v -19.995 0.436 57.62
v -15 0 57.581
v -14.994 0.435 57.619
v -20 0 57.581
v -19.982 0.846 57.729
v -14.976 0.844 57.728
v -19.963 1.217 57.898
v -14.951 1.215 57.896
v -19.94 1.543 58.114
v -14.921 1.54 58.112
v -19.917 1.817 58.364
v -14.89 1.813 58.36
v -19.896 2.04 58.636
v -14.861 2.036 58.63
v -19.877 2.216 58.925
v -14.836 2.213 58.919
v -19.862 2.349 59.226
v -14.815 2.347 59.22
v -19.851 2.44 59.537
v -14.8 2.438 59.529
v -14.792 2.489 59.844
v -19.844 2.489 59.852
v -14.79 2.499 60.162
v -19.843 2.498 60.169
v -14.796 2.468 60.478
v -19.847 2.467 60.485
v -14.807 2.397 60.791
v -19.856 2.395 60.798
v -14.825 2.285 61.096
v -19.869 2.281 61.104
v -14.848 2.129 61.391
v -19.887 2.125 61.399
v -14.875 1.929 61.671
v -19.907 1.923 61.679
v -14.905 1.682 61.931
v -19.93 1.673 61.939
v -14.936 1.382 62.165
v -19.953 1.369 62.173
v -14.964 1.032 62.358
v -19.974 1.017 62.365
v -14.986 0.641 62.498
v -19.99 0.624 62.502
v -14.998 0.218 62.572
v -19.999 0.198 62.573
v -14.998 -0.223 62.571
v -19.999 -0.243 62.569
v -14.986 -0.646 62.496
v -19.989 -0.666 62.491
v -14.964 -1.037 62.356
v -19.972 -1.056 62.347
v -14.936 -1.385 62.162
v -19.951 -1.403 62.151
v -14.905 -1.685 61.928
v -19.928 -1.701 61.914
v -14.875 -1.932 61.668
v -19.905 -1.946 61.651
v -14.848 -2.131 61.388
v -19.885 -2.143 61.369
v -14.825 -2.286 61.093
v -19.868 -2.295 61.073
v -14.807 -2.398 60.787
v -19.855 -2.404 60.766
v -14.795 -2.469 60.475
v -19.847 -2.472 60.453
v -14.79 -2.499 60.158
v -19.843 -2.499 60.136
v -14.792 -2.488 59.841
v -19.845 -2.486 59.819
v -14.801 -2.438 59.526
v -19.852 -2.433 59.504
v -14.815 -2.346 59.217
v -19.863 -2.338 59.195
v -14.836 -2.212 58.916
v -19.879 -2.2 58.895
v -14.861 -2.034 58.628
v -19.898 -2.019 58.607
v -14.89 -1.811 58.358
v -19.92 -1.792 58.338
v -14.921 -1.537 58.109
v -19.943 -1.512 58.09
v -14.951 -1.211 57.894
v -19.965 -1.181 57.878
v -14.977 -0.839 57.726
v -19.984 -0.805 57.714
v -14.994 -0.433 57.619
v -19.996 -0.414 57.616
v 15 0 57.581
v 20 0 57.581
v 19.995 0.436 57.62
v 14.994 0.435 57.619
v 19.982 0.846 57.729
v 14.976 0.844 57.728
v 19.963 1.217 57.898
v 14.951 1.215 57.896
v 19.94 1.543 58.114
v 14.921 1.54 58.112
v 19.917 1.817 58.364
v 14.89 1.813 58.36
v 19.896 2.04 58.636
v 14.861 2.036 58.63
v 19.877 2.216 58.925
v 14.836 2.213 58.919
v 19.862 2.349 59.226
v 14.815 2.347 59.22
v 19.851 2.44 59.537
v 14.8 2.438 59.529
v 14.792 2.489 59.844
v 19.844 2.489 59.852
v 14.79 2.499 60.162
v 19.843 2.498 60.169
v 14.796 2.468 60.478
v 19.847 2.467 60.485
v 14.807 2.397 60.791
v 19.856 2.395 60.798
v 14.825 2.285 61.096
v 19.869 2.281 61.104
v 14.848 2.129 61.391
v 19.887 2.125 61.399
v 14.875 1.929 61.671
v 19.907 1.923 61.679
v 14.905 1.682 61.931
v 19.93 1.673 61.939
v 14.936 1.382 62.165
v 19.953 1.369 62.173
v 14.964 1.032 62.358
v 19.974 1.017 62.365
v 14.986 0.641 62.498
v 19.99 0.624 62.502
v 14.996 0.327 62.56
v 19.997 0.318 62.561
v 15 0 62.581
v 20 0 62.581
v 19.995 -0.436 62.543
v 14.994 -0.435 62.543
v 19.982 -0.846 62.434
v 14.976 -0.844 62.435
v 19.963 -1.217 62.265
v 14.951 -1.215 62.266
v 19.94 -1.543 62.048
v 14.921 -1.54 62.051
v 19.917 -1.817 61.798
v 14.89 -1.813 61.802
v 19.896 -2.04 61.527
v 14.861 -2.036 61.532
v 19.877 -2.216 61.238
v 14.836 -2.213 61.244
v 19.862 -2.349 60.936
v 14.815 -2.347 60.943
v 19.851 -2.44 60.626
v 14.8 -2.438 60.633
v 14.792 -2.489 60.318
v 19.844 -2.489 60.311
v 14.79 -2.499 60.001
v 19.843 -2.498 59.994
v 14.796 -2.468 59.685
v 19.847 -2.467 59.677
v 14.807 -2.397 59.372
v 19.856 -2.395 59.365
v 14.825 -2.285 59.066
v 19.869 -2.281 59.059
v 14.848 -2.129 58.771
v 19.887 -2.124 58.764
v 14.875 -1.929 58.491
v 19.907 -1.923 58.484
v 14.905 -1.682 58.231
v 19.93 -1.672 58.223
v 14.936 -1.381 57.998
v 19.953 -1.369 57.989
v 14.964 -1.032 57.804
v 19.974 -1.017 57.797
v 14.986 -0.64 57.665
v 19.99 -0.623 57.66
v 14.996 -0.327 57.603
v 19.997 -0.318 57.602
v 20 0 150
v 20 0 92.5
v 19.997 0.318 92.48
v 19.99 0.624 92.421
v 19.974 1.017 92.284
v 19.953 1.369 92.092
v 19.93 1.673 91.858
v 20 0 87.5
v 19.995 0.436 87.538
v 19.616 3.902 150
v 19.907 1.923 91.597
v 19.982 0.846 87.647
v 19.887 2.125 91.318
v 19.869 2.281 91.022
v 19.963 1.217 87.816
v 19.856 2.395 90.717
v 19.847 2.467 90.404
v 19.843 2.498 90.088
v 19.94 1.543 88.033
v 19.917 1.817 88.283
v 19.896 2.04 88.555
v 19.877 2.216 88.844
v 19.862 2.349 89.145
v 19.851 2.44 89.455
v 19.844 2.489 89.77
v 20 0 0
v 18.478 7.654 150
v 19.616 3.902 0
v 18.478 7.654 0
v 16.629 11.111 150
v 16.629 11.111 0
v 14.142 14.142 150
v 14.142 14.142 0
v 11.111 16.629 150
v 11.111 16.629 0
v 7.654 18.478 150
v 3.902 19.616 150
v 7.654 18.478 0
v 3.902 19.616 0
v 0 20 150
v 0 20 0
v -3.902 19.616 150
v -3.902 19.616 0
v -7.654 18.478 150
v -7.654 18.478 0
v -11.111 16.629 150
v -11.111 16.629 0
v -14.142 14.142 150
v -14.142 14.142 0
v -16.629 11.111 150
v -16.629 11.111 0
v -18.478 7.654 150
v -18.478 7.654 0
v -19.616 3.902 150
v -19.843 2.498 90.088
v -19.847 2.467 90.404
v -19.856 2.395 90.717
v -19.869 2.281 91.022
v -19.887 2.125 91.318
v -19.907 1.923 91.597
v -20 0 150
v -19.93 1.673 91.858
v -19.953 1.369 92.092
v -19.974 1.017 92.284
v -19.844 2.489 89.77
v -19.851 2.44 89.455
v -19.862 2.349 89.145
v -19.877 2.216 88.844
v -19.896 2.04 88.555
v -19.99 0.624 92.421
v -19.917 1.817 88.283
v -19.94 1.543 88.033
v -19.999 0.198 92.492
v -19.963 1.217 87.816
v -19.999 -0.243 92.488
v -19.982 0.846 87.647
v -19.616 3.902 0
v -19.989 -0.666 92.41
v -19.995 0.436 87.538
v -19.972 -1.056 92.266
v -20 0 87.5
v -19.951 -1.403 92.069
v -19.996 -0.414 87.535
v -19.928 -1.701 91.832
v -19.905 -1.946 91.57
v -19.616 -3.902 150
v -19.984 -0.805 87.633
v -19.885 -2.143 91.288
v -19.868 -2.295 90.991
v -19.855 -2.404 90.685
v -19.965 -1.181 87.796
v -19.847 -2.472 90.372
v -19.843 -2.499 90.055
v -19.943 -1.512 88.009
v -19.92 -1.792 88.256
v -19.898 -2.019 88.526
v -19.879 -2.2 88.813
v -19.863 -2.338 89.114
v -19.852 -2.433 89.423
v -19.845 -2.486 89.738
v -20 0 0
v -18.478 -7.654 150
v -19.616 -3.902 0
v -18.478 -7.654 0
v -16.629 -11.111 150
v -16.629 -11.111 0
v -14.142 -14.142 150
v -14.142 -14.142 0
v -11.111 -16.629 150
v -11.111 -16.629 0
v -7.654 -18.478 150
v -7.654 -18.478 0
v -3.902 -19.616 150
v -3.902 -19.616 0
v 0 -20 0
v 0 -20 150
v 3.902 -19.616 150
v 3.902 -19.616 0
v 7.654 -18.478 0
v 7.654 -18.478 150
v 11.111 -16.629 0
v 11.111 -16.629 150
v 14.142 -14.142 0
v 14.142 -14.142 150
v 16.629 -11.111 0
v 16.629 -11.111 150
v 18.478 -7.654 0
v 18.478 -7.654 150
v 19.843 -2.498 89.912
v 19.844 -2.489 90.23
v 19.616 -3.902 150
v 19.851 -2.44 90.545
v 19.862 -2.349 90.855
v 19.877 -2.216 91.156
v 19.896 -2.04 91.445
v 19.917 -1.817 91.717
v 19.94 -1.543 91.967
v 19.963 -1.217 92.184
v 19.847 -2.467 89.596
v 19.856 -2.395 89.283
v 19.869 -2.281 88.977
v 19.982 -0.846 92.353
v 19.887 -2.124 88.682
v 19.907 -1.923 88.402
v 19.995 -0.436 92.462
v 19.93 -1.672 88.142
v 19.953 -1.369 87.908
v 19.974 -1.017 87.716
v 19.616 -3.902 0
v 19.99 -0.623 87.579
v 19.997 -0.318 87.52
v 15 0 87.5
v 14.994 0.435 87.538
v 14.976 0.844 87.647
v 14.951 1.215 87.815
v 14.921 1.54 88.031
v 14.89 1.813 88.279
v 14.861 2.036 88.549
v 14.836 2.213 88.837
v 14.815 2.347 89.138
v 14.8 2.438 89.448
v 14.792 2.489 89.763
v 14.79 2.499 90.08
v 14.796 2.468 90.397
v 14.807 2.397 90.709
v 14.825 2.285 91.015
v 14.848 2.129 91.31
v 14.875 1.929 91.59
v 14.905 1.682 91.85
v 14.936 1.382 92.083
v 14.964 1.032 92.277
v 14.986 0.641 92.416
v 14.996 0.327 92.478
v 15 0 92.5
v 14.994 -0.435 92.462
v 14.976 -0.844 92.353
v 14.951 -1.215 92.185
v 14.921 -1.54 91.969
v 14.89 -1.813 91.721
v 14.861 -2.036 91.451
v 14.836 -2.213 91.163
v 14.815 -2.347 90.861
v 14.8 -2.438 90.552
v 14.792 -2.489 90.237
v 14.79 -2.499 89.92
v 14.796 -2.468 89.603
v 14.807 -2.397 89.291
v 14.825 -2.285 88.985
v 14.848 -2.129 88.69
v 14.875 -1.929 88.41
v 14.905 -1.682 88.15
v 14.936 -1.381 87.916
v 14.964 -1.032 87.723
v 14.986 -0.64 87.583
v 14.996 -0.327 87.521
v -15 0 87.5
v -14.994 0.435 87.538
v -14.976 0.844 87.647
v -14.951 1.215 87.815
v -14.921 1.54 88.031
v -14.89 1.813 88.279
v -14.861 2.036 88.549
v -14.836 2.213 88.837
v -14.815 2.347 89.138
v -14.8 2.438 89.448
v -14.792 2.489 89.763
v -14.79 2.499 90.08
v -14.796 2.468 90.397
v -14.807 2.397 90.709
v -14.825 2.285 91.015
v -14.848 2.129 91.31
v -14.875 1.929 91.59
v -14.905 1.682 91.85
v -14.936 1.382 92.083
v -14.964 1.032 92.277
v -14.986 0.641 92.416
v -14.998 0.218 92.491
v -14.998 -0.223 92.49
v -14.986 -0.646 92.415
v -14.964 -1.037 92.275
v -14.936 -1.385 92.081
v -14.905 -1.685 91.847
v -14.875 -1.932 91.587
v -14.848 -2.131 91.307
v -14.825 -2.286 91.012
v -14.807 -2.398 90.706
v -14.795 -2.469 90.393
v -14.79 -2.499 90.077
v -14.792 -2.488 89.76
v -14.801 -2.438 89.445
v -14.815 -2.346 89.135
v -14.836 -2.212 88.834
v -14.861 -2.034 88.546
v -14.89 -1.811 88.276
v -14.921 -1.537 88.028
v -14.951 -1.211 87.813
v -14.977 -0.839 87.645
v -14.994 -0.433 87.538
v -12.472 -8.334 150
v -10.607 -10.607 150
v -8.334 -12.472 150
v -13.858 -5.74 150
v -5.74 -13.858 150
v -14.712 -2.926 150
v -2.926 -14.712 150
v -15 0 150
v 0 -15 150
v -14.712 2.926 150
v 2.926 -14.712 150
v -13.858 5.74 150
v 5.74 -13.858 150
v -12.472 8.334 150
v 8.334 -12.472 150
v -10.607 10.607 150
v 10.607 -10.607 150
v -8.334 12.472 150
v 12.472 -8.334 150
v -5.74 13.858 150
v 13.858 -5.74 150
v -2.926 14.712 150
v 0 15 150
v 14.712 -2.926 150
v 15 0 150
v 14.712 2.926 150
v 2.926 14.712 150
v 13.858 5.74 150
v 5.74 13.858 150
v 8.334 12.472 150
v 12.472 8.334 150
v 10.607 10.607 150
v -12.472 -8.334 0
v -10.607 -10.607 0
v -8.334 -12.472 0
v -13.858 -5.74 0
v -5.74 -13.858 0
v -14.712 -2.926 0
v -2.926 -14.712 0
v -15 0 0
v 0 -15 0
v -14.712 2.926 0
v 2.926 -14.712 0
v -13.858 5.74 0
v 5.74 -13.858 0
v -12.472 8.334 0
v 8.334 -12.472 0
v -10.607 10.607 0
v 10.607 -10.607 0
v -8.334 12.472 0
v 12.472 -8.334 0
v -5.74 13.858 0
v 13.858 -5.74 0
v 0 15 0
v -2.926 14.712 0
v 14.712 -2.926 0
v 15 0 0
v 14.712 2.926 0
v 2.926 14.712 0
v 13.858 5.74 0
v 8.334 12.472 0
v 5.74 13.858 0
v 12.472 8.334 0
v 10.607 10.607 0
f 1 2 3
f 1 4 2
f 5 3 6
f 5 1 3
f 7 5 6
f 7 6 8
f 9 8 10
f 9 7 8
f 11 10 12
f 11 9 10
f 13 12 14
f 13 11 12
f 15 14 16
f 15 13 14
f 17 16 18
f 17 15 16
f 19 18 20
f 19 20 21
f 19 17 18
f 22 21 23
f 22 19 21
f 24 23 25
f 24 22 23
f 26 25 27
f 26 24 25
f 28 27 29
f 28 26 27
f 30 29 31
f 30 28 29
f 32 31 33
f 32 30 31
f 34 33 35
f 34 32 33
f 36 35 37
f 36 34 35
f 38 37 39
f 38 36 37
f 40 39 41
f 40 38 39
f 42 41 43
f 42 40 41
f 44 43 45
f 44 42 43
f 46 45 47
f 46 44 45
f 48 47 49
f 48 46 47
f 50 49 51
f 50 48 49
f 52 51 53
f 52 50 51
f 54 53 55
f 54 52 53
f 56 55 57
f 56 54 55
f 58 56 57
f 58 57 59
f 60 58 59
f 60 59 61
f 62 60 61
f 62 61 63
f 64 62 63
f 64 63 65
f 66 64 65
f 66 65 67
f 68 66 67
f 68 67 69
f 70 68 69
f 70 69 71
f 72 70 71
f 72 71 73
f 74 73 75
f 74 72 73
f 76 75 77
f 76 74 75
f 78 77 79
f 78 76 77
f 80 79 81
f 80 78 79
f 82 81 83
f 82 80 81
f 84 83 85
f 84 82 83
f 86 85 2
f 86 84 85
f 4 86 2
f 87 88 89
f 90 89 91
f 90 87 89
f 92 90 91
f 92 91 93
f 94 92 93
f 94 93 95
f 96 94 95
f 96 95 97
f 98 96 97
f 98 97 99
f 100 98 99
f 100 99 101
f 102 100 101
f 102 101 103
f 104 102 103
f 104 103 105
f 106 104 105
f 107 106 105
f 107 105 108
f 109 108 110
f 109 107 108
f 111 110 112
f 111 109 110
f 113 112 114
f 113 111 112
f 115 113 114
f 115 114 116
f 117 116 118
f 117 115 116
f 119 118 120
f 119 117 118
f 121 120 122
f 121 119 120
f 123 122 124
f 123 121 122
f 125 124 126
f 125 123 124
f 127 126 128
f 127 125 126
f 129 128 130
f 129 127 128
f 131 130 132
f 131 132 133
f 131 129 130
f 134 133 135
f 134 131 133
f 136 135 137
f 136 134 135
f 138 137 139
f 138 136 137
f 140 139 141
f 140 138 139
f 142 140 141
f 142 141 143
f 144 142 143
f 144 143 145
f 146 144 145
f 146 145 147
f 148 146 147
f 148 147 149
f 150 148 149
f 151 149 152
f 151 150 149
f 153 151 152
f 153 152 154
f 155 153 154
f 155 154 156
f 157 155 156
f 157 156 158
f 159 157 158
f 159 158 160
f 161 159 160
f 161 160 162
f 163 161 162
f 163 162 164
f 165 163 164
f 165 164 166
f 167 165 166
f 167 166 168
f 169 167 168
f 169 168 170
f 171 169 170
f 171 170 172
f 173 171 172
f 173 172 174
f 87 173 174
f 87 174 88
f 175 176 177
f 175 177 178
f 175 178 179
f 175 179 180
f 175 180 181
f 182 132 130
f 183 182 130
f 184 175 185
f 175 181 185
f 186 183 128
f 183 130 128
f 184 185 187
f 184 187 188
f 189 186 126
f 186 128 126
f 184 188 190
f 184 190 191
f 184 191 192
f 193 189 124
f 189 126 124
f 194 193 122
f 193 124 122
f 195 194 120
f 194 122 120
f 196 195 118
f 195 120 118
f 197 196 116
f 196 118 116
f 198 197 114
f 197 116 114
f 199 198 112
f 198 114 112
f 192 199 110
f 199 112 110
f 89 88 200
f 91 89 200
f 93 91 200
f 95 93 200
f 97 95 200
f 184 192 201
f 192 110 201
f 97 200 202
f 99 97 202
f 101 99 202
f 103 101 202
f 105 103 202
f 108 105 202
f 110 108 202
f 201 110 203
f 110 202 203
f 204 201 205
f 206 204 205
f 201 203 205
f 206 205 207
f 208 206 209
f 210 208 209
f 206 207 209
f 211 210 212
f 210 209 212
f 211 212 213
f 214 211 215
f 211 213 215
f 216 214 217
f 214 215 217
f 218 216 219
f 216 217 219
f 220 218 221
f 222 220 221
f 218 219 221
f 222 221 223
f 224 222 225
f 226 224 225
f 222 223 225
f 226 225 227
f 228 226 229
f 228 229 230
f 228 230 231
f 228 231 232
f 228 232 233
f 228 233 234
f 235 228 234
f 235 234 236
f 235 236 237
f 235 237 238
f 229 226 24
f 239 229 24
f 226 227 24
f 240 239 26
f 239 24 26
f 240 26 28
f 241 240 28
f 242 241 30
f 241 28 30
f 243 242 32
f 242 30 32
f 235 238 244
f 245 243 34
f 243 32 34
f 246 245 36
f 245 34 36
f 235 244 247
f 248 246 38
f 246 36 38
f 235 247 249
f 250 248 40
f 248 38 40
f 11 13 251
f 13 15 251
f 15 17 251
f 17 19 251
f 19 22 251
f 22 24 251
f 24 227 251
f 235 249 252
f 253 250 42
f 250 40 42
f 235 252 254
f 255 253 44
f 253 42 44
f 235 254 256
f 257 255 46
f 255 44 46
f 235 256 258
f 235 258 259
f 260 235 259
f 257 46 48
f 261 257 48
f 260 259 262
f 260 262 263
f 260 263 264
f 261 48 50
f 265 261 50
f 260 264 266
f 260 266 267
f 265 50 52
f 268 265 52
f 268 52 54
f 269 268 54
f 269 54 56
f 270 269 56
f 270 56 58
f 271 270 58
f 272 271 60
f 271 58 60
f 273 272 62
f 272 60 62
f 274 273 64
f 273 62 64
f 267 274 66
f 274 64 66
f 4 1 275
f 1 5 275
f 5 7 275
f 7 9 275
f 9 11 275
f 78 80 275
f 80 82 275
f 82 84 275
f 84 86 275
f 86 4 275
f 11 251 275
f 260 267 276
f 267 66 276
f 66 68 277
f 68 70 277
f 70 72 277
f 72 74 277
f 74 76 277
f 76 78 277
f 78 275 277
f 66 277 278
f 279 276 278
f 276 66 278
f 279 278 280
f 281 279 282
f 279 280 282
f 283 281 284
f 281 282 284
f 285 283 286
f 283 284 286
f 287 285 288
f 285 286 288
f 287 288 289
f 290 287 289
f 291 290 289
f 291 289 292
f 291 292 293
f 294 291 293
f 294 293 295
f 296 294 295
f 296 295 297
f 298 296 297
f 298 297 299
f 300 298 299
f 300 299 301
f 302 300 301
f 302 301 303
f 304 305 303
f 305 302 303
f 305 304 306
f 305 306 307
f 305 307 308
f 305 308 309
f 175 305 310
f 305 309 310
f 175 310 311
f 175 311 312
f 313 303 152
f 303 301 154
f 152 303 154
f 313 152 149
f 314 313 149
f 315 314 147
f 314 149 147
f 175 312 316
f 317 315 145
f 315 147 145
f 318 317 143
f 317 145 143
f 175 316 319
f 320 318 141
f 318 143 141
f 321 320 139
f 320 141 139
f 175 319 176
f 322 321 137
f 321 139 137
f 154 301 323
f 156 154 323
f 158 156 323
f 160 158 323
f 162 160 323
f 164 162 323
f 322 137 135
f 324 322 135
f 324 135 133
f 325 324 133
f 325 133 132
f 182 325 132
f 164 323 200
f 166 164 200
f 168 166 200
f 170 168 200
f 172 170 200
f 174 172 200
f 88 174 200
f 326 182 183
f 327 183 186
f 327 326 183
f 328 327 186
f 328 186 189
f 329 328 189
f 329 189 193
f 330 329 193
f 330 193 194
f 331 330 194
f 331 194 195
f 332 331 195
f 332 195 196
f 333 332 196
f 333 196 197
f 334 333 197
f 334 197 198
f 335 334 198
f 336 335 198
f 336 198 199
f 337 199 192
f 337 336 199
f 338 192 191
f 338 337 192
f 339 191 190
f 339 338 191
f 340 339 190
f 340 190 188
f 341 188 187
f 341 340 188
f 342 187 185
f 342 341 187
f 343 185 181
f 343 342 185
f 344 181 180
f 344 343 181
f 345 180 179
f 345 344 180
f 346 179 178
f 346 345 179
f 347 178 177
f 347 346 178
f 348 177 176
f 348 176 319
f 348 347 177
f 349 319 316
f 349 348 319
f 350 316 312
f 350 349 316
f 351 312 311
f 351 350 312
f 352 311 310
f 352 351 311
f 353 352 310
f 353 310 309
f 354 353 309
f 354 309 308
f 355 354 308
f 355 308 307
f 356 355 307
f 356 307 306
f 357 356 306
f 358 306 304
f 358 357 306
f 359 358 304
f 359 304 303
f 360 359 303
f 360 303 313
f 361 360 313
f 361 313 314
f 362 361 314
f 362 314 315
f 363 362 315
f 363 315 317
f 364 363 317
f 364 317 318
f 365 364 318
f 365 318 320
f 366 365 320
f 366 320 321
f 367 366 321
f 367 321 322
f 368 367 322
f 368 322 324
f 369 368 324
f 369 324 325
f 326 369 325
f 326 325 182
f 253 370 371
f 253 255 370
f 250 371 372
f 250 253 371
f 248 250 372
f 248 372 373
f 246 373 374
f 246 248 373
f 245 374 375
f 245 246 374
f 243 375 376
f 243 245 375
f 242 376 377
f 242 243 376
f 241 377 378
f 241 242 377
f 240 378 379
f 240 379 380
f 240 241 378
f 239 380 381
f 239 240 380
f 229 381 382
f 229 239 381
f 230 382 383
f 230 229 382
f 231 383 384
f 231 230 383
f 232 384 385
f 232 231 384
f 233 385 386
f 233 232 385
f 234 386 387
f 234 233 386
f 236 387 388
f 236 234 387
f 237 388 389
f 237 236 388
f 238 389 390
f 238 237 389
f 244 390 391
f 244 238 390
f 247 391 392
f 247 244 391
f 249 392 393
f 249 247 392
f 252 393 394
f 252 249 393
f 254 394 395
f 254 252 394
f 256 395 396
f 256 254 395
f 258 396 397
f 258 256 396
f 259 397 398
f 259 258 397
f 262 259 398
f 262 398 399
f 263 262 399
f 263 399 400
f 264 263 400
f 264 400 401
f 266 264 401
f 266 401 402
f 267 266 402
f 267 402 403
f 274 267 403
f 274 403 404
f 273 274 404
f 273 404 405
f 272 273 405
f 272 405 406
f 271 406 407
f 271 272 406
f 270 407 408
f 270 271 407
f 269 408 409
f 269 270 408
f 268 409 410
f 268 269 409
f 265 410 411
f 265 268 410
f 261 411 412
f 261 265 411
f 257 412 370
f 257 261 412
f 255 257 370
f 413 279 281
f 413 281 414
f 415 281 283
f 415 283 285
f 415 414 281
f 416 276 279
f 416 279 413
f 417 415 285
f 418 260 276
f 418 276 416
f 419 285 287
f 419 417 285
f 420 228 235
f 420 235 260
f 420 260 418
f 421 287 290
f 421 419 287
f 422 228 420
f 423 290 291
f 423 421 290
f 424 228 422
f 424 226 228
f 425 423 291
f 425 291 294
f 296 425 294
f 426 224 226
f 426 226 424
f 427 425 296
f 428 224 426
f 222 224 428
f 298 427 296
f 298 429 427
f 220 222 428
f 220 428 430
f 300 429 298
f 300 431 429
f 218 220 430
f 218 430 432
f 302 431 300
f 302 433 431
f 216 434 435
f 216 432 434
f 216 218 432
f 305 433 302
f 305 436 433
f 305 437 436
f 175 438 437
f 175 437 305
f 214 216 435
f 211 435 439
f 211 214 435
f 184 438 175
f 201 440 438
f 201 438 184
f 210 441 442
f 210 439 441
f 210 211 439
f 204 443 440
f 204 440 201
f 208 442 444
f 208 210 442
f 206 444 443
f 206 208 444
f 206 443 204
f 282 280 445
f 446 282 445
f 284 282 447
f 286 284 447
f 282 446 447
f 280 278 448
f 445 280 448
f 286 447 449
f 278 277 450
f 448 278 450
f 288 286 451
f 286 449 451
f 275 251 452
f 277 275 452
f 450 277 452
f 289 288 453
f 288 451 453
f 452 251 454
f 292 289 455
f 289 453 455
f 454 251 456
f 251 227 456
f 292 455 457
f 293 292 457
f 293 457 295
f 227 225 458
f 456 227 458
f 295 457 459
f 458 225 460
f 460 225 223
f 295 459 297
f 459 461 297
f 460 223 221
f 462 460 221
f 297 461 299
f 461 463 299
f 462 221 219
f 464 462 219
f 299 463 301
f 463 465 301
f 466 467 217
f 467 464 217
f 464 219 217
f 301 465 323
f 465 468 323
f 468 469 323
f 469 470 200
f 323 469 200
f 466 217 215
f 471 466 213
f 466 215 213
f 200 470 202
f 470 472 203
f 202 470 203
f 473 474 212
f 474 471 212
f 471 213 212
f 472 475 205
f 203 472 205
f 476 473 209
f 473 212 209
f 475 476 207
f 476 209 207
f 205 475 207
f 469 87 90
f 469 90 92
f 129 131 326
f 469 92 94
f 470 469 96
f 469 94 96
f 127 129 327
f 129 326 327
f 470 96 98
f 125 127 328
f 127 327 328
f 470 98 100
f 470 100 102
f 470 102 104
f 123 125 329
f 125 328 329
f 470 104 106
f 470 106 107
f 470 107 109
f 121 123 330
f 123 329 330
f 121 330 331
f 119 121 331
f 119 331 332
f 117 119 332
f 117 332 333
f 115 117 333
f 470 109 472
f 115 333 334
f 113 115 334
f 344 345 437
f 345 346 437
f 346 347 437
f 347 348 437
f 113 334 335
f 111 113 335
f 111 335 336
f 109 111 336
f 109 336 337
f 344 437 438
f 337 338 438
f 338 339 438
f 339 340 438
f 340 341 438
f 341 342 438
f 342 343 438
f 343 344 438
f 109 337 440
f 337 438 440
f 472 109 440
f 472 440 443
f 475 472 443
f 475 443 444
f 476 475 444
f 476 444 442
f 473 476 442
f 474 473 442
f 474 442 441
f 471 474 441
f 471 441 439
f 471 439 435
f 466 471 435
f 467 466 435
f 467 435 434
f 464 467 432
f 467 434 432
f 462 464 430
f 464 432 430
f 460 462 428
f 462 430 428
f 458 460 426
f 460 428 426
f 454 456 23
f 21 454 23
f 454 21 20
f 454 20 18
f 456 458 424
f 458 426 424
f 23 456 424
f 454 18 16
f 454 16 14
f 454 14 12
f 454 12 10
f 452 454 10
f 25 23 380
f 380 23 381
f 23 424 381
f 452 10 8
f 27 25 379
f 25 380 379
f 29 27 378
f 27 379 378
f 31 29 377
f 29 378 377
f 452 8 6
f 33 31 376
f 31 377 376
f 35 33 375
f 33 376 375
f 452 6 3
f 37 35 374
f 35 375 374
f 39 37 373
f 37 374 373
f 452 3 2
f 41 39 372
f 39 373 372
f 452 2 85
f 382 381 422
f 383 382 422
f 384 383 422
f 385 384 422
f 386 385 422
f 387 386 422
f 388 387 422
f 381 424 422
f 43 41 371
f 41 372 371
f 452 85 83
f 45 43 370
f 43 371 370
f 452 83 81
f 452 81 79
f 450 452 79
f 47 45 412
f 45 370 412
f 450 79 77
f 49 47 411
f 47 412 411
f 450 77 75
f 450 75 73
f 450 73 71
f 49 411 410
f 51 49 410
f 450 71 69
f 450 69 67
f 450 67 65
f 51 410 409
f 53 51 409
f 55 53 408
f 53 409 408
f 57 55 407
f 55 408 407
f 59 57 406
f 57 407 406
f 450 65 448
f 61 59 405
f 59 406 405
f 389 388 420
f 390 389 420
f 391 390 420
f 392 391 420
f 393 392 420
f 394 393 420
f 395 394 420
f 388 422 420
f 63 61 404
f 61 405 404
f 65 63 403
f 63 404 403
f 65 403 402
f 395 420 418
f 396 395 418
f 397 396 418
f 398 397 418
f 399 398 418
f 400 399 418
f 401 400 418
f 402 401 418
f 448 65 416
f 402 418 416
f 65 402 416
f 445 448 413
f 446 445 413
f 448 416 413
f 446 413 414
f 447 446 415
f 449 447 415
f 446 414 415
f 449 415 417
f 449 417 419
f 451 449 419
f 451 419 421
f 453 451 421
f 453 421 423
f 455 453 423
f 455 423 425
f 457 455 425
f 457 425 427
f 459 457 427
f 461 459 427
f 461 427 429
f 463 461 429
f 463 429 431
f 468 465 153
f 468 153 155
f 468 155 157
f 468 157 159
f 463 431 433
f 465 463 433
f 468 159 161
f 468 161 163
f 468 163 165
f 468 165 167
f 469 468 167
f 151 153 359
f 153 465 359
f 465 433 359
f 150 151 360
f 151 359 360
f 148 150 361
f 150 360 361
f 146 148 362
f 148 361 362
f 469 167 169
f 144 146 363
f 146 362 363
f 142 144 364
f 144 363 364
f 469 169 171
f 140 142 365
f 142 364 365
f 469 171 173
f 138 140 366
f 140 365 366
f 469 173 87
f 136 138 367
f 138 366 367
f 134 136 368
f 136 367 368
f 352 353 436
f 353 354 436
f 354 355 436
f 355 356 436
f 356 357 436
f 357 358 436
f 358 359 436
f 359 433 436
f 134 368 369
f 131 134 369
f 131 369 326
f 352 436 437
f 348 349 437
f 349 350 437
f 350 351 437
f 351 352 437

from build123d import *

# Parameters (mm, degrees)
SKETCH1_R               = 20
BOSS_EXTRUDE1_DEPTH     = 150
SKETCH2_R               = 15
CUT_EXTRUDE1_DEPTH      = 150
CUT_EXTRUDE2_DEPTH      = 153.643375225
CUT_EXTRUDE2_DEPTH_BACK = 153.643375225
SKETCH3_R               = 2.5


with BuildPart() as part:
    # Sketch1 → Boss-Extrude1 (new body)
    with BuildSketch(Plane.XY):
        Circle(SKETCH1_R)
    extrude(amount=BOSS_EXTRUDE1_DEPTH)

    # Sketch2 → Cut-Extrude1 (cut)
    with BuildSketch(Plane.XY.offset(150)):
        Circle(SKETCH2_R)
    extrude(amount=-CUT_EXTRUDE1_DEPTH, mode=Mode.SUBTRACT)

    # Sketch3 → Cut-Extrude2 (cut, two sides: drawn at the far end of the back side and taken through both)
    with BuildSketch(Plane(origin=(0, 0, 0), x_dir=(0, 0, -1), z_dir=(1, 0, 0)).offset(-CUT_EXTRUDE2_DEPTH_BACK)):
        with Locations((-90, 0)):
            Circle(SKETCH3_R)
        with Locations((-60.081308212, 0)):
            Circle(SKETCH3_R)
    extrude(amount=CUT_EXTRUDE2_DEPTH + CUT_EXTRUDE2_DEPTH_BACK, mode=Mode.SUBTRACT)


solid = part.part
